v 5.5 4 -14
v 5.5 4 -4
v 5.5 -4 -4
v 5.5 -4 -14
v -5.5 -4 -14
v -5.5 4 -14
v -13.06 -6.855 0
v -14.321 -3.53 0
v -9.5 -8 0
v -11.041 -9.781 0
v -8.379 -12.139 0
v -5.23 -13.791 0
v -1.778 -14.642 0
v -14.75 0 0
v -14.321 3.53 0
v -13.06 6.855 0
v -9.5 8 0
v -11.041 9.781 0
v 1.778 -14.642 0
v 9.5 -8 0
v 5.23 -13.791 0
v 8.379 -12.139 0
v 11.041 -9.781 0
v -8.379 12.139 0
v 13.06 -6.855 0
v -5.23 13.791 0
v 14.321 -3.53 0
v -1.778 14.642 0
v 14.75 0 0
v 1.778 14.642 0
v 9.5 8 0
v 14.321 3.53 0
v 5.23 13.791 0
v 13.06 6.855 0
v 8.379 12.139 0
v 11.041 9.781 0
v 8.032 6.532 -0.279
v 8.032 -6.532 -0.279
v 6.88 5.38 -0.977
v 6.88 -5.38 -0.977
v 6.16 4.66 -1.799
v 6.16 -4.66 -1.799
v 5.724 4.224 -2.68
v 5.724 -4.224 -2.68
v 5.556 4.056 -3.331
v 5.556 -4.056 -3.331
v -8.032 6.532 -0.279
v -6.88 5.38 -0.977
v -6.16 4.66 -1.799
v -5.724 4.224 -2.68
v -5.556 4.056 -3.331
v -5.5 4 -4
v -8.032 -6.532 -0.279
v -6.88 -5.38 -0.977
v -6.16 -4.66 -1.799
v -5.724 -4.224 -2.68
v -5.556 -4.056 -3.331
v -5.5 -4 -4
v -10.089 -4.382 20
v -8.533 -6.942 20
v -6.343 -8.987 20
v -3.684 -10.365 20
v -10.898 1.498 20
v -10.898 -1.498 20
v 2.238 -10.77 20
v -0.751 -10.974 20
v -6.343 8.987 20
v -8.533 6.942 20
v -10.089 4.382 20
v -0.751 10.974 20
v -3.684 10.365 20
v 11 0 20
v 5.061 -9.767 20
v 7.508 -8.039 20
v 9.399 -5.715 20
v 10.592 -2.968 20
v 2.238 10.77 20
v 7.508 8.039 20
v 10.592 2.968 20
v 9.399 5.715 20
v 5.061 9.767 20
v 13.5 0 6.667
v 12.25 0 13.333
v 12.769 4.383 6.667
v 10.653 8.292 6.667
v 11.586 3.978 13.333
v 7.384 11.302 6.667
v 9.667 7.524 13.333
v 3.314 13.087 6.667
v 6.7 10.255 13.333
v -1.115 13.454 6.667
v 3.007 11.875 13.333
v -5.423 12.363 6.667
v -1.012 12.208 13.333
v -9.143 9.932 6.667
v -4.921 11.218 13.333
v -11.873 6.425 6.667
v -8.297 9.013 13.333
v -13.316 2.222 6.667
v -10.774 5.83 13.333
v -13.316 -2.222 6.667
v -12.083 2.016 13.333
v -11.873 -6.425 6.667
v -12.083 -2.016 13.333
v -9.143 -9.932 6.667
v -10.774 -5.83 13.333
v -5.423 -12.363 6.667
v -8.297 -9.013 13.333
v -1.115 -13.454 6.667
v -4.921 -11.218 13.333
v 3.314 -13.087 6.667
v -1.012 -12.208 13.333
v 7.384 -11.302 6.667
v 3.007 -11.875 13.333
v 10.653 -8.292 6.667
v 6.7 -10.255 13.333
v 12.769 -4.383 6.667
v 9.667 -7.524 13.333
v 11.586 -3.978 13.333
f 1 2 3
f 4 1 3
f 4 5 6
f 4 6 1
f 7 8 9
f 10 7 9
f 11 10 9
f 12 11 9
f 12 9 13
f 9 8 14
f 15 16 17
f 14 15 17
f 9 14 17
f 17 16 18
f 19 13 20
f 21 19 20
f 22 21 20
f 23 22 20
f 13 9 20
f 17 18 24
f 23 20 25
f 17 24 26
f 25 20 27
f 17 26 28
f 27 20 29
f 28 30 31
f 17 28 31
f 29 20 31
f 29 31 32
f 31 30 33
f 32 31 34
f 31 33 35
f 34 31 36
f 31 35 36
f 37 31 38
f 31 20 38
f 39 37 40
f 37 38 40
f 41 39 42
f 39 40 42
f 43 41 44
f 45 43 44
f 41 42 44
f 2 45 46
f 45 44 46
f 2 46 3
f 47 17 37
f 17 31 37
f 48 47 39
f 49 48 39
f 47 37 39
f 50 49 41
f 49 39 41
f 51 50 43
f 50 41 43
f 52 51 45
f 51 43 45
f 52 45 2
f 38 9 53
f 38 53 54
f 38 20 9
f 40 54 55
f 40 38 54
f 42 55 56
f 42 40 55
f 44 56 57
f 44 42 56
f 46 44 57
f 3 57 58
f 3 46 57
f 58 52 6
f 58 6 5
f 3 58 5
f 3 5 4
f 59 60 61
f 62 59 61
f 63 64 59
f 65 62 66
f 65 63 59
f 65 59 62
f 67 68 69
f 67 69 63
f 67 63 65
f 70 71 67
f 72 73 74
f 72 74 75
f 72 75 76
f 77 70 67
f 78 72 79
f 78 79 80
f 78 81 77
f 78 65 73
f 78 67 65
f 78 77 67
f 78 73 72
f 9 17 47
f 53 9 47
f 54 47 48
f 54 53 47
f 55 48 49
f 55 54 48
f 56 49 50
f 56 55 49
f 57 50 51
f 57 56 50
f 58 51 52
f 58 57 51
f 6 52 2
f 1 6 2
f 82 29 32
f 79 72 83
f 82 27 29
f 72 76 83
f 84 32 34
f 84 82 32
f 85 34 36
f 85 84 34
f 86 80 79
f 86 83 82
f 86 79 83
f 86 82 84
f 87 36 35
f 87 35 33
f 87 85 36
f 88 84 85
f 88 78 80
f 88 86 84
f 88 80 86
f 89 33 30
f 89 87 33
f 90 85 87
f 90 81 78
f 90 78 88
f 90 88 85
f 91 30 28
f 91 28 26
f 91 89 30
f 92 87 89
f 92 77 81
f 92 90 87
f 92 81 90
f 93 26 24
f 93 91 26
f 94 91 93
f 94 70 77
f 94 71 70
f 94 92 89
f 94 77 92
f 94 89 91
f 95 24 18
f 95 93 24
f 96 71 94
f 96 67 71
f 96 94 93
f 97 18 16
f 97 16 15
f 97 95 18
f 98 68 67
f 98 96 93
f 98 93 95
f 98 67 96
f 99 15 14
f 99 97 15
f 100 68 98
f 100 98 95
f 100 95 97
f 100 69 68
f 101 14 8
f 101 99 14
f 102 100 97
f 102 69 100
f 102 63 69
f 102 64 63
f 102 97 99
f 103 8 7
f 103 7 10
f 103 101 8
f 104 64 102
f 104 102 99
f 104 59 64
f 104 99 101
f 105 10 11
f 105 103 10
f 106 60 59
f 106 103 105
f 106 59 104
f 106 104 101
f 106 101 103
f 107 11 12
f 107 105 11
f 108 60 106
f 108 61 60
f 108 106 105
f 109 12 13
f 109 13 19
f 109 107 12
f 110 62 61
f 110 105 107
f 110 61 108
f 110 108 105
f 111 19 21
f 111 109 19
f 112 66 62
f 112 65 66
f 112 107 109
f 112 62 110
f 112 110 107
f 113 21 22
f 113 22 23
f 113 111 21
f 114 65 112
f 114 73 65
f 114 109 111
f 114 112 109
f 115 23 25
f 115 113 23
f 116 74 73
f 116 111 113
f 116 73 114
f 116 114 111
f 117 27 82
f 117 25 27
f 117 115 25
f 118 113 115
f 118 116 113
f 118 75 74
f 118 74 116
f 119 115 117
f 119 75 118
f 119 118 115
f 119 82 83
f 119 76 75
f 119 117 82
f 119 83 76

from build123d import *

# Parameters (mm, degrees)
SKETCH_R    = 14.75
SKETCH001_R = 11
SKETCH002_W = 11
SKETCH002_H = 8
PAD_DEPTH   = 14
FILLET_R    = 4


with BuildPart() as part:
    # Sketch → AdditiveLoft section 0
    with BuildSketch(Plane.XY):
        Circle(SKETCH_R)
    # Sketch001 (on DatumPlane) → AdditiveLoft section 1
    with BuildSketch(Plane.XY.offset(20)):
        Circle(SKETCH001_R)
    loft()

    # Sketch002 (on Face1 of AdditiveLoft) → Pad (new body)
    with BuildSketch(Plane(origin=(0, 0, 0), x_dir=(1, 0, 0), z_dir=(0, 0, -1))):
        Rectangle(SKETCH002_W, SKETCH002_H)
    extrude(amount=PAD_DEPTH)

    # Fillet
    fillet_edges = [part.edges().sort_by_distance(p)[0] for p in [
        (5.5, 0, 0),
        (0, -4, 0),
        (0, 4, 0),
        (-5.5, 0, 0),
    ]]
    fillet(fillet_edges, radius=FILLET_R)


solid = part.part
